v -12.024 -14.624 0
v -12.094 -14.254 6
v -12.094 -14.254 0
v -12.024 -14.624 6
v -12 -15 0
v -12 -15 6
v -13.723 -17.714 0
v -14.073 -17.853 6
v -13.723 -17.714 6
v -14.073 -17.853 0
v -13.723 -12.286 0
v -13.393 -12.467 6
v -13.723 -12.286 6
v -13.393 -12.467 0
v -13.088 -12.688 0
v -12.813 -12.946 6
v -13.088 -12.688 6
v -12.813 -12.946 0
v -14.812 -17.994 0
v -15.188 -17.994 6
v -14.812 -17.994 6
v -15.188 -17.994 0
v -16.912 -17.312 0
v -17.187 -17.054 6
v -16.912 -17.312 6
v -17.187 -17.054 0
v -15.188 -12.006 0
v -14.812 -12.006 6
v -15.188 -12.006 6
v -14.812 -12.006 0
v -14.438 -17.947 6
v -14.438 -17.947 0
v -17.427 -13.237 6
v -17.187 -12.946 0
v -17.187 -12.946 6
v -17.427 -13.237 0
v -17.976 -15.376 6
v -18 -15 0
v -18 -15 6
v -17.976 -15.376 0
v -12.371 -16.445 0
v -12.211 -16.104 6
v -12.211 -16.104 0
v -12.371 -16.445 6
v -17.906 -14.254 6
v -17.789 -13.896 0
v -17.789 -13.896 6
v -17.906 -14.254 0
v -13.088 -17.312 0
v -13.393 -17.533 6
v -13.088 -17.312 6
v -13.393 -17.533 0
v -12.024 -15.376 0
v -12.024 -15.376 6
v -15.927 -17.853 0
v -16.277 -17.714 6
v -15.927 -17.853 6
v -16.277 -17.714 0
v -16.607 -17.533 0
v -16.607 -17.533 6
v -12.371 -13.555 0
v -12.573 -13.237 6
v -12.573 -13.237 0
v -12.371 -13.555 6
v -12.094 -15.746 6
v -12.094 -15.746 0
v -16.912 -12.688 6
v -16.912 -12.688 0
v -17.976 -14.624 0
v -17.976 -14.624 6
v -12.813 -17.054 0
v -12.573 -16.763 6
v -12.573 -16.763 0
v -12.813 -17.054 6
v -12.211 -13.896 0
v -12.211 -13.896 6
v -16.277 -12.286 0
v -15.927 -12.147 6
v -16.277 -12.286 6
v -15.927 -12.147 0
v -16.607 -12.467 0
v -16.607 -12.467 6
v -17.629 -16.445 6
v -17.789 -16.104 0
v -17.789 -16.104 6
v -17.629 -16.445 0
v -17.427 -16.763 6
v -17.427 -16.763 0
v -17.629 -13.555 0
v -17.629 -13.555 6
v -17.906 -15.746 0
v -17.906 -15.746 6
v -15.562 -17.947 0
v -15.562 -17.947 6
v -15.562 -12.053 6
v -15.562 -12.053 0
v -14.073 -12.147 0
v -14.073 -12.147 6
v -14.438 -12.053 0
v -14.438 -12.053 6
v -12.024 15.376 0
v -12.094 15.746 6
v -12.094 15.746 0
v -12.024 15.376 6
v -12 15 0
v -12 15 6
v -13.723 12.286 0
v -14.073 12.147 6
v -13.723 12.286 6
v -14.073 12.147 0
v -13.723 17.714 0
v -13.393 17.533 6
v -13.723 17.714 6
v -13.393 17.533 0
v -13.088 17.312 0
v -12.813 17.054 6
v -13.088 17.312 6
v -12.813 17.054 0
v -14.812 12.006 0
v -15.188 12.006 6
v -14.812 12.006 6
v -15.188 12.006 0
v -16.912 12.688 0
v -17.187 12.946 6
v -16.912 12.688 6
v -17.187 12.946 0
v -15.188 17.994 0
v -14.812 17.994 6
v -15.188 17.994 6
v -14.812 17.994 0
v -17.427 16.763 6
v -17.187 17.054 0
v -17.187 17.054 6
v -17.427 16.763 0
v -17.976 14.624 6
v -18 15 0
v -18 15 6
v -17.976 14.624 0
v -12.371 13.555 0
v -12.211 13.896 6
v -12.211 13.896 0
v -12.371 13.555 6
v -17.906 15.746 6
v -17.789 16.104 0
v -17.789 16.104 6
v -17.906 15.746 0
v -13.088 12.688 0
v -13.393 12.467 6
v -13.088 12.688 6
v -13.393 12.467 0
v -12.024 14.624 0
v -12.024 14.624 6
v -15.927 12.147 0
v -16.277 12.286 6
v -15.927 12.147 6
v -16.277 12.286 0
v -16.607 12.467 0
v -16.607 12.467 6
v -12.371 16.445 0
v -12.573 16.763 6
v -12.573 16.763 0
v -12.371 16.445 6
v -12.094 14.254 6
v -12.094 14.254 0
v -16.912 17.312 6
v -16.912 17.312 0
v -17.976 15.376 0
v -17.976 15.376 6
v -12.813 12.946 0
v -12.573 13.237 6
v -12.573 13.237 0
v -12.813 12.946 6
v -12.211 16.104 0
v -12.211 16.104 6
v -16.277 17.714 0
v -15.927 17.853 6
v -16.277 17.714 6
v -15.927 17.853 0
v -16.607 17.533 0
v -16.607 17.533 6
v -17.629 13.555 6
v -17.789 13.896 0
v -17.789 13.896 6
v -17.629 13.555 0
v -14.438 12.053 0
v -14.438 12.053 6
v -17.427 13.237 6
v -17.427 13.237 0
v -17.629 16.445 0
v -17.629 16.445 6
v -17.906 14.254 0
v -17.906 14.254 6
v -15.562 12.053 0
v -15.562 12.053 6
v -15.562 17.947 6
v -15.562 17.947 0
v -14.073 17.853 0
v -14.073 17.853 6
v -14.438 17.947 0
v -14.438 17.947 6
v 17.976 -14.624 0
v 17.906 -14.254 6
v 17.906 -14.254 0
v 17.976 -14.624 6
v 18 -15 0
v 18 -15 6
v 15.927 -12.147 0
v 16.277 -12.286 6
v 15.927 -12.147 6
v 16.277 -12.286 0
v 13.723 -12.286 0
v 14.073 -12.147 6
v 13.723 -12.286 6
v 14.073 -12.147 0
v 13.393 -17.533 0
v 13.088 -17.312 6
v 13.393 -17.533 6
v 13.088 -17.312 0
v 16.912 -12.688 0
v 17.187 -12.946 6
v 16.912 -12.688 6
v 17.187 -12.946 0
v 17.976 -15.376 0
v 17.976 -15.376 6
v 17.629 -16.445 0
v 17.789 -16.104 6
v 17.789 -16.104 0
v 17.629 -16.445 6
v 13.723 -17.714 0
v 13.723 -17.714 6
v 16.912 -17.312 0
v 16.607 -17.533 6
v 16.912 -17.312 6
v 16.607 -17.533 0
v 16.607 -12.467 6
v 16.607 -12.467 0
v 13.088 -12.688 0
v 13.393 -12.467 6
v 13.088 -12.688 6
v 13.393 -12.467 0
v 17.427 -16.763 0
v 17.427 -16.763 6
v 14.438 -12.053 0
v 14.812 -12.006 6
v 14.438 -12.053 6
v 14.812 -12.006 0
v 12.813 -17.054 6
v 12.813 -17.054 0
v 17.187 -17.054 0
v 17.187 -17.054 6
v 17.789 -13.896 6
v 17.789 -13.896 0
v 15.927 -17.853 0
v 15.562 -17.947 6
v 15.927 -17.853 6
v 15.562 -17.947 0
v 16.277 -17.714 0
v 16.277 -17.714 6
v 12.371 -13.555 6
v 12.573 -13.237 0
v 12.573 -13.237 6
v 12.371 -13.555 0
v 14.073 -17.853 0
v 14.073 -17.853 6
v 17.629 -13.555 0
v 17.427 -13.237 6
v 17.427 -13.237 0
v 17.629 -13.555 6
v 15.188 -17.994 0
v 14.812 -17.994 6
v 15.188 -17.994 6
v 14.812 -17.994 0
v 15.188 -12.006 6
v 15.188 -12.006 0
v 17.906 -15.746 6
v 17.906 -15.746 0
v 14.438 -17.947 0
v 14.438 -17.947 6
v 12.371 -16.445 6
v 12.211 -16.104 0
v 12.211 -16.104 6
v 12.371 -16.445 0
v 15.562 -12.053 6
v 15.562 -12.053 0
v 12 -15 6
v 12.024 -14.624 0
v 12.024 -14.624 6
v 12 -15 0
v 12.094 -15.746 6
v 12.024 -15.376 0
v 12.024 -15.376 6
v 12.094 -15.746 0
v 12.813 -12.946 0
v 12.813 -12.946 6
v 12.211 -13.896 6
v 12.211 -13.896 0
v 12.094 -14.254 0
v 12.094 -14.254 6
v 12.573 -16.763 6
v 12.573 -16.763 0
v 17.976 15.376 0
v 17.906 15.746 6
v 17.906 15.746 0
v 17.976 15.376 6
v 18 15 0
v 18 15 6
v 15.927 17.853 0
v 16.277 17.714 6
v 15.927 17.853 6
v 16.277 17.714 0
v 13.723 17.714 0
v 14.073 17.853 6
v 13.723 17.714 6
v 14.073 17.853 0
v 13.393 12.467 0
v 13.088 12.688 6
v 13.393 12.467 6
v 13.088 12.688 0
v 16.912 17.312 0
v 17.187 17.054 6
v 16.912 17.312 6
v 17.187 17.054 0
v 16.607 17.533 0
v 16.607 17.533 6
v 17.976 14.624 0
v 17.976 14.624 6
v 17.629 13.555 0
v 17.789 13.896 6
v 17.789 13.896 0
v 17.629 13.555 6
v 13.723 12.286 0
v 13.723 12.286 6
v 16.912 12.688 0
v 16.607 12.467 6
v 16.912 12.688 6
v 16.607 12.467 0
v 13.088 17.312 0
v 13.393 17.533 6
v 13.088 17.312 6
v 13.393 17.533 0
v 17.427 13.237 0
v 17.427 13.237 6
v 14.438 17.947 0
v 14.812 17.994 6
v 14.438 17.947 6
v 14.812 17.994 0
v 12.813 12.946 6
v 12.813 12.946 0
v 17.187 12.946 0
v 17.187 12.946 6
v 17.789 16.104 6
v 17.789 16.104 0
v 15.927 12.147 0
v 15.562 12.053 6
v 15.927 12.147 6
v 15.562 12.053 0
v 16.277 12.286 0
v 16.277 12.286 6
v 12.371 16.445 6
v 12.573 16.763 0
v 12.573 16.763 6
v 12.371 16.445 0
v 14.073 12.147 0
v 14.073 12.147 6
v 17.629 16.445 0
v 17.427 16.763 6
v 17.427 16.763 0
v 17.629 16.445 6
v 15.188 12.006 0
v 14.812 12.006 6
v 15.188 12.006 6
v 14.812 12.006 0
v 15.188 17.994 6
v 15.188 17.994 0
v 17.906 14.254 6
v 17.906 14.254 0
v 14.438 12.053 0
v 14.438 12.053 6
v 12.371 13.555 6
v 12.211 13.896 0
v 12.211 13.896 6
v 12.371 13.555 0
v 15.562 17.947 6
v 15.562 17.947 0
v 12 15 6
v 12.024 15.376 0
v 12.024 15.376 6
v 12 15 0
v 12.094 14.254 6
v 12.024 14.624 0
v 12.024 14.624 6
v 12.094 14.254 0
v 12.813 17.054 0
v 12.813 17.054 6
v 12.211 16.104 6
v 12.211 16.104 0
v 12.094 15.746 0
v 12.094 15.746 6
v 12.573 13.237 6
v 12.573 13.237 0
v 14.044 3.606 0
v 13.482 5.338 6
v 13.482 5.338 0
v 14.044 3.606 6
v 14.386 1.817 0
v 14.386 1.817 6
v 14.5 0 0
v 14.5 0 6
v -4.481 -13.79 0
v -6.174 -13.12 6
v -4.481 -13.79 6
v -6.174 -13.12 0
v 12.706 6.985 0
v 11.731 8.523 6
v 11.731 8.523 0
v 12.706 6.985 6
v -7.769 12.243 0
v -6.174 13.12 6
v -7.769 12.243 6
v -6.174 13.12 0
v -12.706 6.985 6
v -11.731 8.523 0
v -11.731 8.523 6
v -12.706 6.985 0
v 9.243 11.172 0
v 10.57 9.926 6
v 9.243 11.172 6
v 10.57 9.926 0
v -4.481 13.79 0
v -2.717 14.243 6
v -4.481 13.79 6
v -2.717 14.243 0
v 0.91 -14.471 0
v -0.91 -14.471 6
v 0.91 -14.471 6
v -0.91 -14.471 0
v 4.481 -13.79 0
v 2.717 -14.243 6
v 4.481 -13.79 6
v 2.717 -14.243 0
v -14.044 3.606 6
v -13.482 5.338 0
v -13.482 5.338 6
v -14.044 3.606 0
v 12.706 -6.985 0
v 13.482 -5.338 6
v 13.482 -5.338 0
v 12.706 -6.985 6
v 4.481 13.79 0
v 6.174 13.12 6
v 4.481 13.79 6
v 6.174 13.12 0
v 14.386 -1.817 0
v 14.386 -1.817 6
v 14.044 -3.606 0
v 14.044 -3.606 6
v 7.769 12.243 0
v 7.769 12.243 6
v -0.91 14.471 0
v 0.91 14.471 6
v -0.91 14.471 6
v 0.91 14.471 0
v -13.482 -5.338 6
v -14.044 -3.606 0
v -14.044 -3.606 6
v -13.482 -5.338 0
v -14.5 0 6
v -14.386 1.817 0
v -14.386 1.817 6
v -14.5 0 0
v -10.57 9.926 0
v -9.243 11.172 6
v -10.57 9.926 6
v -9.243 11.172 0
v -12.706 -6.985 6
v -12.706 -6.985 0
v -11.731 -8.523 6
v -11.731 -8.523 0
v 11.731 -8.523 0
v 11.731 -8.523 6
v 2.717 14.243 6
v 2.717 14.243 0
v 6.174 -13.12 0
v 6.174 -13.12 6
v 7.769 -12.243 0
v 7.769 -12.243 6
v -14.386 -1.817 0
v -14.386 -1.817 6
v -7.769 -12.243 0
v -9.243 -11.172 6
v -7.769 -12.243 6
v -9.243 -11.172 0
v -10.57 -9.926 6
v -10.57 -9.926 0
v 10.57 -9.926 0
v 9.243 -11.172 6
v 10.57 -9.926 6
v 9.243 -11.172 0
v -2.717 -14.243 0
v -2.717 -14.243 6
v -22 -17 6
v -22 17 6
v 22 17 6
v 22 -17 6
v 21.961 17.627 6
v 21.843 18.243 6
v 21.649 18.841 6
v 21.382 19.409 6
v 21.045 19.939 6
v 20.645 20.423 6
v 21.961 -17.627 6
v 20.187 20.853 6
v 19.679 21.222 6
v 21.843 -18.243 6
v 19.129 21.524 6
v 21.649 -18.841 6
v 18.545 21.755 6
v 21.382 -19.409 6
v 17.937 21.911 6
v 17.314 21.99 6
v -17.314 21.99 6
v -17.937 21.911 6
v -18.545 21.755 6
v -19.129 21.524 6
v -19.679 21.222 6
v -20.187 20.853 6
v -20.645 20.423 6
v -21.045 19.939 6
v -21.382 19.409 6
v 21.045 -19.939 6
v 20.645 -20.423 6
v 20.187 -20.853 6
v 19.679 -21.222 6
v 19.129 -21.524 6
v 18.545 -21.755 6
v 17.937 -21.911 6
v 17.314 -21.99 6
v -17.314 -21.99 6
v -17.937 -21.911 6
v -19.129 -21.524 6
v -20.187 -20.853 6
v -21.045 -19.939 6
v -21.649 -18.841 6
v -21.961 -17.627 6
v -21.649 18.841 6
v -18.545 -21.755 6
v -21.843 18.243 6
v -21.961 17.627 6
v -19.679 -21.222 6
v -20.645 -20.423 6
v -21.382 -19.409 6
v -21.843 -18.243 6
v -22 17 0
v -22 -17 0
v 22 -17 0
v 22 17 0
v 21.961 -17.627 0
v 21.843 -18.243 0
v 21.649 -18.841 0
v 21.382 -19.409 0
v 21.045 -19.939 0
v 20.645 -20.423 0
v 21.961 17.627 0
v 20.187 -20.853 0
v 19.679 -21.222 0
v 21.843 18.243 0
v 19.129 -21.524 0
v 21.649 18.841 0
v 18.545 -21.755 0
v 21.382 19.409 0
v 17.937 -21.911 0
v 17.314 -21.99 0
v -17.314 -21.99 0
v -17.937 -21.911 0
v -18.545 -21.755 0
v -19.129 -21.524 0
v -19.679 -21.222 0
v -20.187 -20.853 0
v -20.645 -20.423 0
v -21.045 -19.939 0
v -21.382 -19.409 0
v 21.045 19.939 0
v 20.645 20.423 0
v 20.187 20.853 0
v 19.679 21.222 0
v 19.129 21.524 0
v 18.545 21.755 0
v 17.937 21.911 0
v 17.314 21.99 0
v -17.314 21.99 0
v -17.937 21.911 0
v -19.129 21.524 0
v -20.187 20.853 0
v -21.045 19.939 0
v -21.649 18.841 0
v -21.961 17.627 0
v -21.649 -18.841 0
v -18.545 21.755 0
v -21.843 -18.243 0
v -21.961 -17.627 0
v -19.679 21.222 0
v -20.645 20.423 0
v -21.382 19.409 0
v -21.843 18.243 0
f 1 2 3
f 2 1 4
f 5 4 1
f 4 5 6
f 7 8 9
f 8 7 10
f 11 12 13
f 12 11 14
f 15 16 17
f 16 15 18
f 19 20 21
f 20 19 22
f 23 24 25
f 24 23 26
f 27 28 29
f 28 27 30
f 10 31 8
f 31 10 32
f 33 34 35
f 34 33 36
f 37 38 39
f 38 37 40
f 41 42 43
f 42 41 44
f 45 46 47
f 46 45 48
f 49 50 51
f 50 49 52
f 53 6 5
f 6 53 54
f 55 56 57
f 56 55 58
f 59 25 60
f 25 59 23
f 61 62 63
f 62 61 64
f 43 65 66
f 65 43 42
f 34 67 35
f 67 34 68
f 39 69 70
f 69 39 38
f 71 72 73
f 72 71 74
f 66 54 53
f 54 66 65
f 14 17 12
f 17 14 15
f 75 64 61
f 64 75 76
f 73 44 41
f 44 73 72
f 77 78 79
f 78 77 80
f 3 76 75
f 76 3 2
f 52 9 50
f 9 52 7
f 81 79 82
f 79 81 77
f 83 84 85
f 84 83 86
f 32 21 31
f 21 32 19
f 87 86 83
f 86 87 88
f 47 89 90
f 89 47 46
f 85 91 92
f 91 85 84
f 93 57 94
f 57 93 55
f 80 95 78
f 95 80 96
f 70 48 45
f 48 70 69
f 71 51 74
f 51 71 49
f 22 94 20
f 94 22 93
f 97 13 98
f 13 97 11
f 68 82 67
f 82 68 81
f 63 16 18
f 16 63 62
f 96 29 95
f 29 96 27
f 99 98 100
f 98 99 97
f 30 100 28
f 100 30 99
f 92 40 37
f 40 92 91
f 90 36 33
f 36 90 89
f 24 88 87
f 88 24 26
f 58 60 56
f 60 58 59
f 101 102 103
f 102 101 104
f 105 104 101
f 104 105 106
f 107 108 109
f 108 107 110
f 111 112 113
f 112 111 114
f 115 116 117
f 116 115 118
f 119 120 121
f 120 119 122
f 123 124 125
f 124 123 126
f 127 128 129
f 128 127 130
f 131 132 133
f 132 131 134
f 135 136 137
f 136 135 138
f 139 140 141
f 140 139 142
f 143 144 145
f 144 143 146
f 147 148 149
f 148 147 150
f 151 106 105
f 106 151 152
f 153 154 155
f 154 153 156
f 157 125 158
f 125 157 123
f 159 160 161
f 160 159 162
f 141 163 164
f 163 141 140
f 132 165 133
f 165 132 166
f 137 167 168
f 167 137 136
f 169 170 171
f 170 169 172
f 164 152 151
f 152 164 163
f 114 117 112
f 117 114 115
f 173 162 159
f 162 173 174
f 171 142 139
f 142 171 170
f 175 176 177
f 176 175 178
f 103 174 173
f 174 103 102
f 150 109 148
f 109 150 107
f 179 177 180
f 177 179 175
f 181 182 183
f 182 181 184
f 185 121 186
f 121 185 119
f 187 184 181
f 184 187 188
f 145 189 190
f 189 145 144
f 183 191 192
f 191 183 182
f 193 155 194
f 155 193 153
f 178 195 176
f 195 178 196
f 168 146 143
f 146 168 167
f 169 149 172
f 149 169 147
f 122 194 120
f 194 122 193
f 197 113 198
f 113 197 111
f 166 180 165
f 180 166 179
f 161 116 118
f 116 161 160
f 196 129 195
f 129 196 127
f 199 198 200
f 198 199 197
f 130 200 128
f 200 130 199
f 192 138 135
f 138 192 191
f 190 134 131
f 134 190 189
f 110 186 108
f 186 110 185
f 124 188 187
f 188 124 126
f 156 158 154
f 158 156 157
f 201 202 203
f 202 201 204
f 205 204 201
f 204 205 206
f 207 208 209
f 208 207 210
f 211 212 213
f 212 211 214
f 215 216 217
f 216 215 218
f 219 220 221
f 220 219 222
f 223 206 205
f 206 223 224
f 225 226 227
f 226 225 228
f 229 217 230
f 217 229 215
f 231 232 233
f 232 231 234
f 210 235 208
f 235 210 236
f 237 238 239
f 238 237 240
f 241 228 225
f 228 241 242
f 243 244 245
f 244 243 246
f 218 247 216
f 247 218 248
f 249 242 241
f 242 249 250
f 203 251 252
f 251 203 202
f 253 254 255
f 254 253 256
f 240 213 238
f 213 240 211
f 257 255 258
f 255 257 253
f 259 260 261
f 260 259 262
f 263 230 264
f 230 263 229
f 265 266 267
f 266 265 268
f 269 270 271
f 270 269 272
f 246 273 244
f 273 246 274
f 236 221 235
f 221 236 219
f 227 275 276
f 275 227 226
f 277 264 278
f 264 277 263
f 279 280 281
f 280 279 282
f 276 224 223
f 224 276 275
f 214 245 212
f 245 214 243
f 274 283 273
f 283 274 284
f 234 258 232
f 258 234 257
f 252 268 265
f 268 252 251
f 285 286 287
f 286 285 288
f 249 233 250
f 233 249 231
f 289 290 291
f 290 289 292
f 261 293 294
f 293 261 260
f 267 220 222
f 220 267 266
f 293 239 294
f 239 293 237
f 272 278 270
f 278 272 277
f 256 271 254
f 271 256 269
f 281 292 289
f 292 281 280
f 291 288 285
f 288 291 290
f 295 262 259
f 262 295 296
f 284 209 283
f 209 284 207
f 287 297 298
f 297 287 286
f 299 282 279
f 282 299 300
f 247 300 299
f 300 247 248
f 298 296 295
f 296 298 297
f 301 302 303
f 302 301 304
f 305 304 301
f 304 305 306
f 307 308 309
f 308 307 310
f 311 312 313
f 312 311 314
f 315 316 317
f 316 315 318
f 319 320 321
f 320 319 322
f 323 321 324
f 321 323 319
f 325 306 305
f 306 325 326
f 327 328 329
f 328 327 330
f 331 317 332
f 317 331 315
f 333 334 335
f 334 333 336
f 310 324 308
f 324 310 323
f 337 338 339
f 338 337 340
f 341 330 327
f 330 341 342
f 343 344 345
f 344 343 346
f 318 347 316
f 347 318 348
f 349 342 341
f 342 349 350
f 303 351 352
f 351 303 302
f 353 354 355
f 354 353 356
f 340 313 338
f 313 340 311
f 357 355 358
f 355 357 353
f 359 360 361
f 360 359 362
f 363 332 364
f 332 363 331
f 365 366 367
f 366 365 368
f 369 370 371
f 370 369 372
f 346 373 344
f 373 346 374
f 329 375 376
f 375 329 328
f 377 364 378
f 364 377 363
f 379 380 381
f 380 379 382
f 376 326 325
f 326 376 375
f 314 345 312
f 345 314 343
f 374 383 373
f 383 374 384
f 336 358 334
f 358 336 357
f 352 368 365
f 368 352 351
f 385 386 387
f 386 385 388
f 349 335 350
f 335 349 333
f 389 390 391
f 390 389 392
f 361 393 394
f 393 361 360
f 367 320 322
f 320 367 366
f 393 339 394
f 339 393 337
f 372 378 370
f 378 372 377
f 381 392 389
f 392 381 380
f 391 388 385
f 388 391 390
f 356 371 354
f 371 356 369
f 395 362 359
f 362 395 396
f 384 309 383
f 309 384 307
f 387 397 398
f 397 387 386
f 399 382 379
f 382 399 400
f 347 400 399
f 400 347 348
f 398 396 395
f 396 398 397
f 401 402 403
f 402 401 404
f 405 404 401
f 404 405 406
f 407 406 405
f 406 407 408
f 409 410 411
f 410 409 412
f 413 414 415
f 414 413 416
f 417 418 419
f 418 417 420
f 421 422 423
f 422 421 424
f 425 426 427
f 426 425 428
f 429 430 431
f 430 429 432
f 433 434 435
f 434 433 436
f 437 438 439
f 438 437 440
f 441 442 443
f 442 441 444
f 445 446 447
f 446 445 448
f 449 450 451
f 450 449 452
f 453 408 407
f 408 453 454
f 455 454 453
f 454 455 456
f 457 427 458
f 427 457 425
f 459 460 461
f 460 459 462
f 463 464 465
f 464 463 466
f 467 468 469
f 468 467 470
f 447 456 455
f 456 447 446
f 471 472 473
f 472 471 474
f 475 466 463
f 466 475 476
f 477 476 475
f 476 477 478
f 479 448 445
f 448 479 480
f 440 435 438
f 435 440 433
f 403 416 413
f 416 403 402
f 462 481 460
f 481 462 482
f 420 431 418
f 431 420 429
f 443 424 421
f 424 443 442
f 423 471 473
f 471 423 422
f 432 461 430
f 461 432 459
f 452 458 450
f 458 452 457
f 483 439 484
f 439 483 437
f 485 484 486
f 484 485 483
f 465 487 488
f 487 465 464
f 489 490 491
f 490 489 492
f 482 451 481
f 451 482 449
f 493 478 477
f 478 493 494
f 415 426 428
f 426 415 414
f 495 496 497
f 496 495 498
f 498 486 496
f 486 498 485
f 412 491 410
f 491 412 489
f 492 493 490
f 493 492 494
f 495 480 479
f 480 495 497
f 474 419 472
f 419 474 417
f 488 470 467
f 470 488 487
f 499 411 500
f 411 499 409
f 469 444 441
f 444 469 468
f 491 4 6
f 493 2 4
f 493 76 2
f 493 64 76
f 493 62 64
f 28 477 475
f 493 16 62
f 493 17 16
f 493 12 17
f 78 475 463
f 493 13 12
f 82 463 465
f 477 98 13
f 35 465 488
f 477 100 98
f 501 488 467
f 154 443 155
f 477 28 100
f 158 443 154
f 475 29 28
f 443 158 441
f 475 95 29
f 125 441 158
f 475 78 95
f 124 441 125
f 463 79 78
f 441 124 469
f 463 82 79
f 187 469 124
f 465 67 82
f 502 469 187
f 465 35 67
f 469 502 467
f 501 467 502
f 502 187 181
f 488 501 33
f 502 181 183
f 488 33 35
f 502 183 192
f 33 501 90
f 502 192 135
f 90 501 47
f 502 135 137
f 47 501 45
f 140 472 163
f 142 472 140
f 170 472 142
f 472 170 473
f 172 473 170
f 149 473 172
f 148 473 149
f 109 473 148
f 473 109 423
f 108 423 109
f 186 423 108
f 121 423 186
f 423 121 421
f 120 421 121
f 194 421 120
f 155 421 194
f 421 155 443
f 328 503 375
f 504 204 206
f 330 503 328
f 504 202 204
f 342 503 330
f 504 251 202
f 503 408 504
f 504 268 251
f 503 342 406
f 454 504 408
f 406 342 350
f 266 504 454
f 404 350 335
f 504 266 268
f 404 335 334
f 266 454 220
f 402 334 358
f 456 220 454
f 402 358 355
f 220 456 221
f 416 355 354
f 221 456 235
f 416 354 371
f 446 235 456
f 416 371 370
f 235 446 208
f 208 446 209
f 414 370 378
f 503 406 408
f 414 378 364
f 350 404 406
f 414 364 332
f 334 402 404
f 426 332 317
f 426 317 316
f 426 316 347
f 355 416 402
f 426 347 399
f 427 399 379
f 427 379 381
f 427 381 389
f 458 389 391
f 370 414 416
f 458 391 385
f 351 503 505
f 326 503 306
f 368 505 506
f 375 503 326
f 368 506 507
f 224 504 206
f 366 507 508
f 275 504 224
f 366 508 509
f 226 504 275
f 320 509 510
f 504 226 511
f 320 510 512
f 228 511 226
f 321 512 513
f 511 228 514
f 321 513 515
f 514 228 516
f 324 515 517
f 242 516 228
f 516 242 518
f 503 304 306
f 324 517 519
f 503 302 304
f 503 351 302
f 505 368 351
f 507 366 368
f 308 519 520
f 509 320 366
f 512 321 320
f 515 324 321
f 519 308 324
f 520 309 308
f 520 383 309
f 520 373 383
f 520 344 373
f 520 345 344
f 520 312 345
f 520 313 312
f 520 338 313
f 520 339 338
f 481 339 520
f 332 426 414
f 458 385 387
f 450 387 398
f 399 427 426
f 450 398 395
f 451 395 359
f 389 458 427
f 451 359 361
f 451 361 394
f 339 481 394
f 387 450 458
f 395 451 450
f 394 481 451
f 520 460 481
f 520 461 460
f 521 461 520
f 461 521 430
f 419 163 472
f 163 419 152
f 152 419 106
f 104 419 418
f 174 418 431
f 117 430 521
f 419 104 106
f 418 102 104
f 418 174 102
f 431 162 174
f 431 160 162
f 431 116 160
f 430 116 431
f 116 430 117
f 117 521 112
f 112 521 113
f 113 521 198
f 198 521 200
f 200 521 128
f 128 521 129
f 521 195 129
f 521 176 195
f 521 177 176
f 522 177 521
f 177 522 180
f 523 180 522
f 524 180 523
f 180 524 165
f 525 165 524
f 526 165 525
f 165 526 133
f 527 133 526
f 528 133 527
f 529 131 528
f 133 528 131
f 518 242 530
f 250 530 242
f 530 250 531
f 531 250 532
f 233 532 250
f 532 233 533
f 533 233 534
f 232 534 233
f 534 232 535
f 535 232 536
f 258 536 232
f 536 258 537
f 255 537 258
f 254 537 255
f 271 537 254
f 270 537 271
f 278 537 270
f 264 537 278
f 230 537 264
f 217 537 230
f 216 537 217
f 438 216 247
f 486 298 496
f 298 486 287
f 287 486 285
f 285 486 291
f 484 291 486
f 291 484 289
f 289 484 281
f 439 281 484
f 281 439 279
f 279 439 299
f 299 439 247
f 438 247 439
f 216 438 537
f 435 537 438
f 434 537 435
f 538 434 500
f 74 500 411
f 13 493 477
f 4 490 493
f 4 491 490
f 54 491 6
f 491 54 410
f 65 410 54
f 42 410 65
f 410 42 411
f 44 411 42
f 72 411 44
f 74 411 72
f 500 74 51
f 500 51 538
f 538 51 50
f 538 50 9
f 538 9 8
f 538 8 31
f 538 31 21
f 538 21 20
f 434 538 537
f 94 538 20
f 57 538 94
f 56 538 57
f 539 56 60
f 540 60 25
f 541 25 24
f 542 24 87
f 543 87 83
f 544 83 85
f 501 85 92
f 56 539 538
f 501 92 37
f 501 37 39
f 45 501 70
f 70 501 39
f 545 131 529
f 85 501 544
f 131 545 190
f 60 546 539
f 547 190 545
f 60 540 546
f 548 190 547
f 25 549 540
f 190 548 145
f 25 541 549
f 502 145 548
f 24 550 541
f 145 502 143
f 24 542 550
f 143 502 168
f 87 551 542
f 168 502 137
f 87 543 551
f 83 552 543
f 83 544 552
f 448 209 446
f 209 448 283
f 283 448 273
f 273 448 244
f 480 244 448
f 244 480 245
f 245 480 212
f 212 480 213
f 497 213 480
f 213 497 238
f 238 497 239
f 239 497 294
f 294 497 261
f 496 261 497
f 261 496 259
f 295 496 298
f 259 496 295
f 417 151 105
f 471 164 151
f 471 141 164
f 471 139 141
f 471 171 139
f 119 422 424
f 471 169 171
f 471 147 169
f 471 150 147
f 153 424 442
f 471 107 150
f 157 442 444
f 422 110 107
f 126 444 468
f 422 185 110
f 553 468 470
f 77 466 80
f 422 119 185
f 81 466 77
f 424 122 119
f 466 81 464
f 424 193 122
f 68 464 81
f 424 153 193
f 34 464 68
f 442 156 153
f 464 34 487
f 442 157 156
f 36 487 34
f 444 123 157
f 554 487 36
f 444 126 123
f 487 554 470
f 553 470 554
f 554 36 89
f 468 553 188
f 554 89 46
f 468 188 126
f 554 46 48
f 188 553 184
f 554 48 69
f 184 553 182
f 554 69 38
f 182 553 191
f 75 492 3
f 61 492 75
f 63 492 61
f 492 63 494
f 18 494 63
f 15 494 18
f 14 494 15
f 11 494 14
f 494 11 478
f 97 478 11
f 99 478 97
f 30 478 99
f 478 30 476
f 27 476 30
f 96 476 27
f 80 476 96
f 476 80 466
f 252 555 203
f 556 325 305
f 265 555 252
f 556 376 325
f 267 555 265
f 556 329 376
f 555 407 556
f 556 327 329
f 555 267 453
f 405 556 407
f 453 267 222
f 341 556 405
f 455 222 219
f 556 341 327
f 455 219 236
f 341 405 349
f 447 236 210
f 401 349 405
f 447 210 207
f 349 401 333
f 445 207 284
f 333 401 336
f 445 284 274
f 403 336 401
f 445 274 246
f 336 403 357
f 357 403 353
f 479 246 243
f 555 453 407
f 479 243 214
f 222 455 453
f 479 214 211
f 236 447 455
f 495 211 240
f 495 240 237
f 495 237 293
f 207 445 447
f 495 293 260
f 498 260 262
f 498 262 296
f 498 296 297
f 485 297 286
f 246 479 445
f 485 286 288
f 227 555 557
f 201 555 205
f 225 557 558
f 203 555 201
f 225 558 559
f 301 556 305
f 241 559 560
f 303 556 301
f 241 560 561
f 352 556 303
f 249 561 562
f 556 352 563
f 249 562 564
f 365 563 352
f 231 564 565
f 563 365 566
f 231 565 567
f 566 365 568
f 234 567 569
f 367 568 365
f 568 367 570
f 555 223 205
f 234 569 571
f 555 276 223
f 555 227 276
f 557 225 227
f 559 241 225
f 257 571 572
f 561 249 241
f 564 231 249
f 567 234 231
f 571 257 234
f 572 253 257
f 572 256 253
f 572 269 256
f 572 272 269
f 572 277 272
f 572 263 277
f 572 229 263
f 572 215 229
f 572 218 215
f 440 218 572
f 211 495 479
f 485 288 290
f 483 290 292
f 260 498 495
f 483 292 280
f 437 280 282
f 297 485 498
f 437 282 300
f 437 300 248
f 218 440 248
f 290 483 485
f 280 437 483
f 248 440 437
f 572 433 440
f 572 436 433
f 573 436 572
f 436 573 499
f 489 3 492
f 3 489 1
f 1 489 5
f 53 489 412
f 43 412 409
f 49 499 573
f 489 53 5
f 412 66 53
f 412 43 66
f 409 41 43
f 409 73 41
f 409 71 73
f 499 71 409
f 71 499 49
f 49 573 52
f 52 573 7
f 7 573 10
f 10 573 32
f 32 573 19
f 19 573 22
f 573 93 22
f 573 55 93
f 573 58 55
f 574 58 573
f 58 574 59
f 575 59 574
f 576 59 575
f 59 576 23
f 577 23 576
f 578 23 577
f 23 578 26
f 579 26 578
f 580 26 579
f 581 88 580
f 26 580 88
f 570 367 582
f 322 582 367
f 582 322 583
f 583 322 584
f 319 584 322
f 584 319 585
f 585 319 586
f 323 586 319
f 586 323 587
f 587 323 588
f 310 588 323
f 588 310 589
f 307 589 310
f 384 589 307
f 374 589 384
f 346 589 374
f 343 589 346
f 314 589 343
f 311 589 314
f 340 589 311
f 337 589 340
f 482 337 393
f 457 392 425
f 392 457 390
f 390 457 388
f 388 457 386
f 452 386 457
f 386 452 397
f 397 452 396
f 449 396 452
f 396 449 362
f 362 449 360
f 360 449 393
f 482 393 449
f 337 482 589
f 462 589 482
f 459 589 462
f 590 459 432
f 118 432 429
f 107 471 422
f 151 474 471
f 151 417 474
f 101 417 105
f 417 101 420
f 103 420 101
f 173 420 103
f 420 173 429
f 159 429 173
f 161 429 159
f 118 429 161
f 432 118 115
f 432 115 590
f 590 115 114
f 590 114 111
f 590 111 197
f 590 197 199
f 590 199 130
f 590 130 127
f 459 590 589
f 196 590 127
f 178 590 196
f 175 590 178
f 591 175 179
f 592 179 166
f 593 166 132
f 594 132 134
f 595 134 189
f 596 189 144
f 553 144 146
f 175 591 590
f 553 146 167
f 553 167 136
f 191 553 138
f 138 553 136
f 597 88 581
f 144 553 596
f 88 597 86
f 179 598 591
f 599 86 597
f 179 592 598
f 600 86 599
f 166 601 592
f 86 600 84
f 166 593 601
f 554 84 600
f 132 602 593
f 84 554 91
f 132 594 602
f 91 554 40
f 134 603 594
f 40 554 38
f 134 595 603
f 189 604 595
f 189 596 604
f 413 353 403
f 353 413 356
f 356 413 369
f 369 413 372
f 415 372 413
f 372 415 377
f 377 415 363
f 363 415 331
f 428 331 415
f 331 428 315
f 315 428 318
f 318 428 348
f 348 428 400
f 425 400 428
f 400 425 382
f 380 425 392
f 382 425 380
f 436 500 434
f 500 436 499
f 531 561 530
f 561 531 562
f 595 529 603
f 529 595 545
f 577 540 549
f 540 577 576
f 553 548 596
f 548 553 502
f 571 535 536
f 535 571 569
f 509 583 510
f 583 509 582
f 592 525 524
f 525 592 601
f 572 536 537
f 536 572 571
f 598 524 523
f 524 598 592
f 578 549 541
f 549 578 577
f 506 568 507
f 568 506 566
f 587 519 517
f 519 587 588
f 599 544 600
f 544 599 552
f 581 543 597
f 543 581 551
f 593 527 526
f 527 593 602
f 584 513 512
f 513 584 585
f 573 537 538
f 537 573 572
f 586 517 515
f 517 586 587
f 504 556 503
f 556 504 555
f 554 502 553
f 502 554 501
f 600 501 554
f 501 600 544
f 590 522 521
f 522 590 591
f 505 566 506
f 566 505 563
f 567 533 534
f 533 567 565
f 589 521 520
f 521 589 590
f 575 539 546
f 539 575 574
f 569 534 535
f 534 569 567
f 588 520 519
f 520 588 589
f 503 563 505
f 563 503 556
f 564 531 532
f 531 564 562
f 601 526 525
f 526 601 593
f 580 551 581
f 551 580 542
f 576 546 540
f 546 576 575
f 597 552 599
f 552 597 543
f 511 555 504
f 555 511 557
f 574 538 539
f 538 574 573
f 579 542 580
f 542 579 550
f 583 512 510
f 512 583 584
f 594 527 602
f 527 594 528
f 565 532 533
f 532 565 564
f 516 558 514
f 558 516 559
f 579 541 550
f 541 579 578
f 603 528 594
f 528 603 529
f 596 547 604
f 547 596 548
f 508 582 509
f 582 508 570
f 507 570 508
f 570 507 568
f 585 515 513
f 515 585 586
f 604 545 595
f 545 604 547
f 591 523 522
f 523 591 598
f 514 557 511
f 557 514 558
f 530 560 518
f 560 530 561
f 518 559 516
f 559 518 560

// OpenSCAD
$fn = 50;


difference() {
	union() {
		hull() {
			translate(v = [-17.0000000000, 17.0000000000, 0]) {
				cylinder(h = 6, r = 5);
			}
			translate(v = [17.0000000000, 17.0000000000, 0]) {
				cylinder(h = 6, r = 5);
			}
			translate(v = [-17.0000000000, -17.0000000000, 0]) {
				cylinder(h = 6, r = 5);
			}
			translate(v = [17.0000000000, -17.0000000000, 0]) {
				cylinder(h = 6, r = 5);
			}
		}
	}
	union() {
		#translate(v = [-15.0000000000, -15.0000000000, -100.0000000000]) {
			cylinder(h = 200, r = 3.0000000000);
		}
		#translate(v = [-15.0000000000, 15.0000000000, -100.0000000000]) {
			cylinder(h = 200, r = 3.0000000000);
		}
		#translate(v = [15.0000000000, -15.0000000000, -100.0000000000]) {
			cylinder(h = 200, r = 3.0000000000);
		}
		#translate(v = [15.0000000000, 15.0000000000, -100.0000000000]) {
			cylinder(h = 200, r = 3.0000000000);
		}
		#cylinder(h = 6, r = 14.5000000000);
	}
}
